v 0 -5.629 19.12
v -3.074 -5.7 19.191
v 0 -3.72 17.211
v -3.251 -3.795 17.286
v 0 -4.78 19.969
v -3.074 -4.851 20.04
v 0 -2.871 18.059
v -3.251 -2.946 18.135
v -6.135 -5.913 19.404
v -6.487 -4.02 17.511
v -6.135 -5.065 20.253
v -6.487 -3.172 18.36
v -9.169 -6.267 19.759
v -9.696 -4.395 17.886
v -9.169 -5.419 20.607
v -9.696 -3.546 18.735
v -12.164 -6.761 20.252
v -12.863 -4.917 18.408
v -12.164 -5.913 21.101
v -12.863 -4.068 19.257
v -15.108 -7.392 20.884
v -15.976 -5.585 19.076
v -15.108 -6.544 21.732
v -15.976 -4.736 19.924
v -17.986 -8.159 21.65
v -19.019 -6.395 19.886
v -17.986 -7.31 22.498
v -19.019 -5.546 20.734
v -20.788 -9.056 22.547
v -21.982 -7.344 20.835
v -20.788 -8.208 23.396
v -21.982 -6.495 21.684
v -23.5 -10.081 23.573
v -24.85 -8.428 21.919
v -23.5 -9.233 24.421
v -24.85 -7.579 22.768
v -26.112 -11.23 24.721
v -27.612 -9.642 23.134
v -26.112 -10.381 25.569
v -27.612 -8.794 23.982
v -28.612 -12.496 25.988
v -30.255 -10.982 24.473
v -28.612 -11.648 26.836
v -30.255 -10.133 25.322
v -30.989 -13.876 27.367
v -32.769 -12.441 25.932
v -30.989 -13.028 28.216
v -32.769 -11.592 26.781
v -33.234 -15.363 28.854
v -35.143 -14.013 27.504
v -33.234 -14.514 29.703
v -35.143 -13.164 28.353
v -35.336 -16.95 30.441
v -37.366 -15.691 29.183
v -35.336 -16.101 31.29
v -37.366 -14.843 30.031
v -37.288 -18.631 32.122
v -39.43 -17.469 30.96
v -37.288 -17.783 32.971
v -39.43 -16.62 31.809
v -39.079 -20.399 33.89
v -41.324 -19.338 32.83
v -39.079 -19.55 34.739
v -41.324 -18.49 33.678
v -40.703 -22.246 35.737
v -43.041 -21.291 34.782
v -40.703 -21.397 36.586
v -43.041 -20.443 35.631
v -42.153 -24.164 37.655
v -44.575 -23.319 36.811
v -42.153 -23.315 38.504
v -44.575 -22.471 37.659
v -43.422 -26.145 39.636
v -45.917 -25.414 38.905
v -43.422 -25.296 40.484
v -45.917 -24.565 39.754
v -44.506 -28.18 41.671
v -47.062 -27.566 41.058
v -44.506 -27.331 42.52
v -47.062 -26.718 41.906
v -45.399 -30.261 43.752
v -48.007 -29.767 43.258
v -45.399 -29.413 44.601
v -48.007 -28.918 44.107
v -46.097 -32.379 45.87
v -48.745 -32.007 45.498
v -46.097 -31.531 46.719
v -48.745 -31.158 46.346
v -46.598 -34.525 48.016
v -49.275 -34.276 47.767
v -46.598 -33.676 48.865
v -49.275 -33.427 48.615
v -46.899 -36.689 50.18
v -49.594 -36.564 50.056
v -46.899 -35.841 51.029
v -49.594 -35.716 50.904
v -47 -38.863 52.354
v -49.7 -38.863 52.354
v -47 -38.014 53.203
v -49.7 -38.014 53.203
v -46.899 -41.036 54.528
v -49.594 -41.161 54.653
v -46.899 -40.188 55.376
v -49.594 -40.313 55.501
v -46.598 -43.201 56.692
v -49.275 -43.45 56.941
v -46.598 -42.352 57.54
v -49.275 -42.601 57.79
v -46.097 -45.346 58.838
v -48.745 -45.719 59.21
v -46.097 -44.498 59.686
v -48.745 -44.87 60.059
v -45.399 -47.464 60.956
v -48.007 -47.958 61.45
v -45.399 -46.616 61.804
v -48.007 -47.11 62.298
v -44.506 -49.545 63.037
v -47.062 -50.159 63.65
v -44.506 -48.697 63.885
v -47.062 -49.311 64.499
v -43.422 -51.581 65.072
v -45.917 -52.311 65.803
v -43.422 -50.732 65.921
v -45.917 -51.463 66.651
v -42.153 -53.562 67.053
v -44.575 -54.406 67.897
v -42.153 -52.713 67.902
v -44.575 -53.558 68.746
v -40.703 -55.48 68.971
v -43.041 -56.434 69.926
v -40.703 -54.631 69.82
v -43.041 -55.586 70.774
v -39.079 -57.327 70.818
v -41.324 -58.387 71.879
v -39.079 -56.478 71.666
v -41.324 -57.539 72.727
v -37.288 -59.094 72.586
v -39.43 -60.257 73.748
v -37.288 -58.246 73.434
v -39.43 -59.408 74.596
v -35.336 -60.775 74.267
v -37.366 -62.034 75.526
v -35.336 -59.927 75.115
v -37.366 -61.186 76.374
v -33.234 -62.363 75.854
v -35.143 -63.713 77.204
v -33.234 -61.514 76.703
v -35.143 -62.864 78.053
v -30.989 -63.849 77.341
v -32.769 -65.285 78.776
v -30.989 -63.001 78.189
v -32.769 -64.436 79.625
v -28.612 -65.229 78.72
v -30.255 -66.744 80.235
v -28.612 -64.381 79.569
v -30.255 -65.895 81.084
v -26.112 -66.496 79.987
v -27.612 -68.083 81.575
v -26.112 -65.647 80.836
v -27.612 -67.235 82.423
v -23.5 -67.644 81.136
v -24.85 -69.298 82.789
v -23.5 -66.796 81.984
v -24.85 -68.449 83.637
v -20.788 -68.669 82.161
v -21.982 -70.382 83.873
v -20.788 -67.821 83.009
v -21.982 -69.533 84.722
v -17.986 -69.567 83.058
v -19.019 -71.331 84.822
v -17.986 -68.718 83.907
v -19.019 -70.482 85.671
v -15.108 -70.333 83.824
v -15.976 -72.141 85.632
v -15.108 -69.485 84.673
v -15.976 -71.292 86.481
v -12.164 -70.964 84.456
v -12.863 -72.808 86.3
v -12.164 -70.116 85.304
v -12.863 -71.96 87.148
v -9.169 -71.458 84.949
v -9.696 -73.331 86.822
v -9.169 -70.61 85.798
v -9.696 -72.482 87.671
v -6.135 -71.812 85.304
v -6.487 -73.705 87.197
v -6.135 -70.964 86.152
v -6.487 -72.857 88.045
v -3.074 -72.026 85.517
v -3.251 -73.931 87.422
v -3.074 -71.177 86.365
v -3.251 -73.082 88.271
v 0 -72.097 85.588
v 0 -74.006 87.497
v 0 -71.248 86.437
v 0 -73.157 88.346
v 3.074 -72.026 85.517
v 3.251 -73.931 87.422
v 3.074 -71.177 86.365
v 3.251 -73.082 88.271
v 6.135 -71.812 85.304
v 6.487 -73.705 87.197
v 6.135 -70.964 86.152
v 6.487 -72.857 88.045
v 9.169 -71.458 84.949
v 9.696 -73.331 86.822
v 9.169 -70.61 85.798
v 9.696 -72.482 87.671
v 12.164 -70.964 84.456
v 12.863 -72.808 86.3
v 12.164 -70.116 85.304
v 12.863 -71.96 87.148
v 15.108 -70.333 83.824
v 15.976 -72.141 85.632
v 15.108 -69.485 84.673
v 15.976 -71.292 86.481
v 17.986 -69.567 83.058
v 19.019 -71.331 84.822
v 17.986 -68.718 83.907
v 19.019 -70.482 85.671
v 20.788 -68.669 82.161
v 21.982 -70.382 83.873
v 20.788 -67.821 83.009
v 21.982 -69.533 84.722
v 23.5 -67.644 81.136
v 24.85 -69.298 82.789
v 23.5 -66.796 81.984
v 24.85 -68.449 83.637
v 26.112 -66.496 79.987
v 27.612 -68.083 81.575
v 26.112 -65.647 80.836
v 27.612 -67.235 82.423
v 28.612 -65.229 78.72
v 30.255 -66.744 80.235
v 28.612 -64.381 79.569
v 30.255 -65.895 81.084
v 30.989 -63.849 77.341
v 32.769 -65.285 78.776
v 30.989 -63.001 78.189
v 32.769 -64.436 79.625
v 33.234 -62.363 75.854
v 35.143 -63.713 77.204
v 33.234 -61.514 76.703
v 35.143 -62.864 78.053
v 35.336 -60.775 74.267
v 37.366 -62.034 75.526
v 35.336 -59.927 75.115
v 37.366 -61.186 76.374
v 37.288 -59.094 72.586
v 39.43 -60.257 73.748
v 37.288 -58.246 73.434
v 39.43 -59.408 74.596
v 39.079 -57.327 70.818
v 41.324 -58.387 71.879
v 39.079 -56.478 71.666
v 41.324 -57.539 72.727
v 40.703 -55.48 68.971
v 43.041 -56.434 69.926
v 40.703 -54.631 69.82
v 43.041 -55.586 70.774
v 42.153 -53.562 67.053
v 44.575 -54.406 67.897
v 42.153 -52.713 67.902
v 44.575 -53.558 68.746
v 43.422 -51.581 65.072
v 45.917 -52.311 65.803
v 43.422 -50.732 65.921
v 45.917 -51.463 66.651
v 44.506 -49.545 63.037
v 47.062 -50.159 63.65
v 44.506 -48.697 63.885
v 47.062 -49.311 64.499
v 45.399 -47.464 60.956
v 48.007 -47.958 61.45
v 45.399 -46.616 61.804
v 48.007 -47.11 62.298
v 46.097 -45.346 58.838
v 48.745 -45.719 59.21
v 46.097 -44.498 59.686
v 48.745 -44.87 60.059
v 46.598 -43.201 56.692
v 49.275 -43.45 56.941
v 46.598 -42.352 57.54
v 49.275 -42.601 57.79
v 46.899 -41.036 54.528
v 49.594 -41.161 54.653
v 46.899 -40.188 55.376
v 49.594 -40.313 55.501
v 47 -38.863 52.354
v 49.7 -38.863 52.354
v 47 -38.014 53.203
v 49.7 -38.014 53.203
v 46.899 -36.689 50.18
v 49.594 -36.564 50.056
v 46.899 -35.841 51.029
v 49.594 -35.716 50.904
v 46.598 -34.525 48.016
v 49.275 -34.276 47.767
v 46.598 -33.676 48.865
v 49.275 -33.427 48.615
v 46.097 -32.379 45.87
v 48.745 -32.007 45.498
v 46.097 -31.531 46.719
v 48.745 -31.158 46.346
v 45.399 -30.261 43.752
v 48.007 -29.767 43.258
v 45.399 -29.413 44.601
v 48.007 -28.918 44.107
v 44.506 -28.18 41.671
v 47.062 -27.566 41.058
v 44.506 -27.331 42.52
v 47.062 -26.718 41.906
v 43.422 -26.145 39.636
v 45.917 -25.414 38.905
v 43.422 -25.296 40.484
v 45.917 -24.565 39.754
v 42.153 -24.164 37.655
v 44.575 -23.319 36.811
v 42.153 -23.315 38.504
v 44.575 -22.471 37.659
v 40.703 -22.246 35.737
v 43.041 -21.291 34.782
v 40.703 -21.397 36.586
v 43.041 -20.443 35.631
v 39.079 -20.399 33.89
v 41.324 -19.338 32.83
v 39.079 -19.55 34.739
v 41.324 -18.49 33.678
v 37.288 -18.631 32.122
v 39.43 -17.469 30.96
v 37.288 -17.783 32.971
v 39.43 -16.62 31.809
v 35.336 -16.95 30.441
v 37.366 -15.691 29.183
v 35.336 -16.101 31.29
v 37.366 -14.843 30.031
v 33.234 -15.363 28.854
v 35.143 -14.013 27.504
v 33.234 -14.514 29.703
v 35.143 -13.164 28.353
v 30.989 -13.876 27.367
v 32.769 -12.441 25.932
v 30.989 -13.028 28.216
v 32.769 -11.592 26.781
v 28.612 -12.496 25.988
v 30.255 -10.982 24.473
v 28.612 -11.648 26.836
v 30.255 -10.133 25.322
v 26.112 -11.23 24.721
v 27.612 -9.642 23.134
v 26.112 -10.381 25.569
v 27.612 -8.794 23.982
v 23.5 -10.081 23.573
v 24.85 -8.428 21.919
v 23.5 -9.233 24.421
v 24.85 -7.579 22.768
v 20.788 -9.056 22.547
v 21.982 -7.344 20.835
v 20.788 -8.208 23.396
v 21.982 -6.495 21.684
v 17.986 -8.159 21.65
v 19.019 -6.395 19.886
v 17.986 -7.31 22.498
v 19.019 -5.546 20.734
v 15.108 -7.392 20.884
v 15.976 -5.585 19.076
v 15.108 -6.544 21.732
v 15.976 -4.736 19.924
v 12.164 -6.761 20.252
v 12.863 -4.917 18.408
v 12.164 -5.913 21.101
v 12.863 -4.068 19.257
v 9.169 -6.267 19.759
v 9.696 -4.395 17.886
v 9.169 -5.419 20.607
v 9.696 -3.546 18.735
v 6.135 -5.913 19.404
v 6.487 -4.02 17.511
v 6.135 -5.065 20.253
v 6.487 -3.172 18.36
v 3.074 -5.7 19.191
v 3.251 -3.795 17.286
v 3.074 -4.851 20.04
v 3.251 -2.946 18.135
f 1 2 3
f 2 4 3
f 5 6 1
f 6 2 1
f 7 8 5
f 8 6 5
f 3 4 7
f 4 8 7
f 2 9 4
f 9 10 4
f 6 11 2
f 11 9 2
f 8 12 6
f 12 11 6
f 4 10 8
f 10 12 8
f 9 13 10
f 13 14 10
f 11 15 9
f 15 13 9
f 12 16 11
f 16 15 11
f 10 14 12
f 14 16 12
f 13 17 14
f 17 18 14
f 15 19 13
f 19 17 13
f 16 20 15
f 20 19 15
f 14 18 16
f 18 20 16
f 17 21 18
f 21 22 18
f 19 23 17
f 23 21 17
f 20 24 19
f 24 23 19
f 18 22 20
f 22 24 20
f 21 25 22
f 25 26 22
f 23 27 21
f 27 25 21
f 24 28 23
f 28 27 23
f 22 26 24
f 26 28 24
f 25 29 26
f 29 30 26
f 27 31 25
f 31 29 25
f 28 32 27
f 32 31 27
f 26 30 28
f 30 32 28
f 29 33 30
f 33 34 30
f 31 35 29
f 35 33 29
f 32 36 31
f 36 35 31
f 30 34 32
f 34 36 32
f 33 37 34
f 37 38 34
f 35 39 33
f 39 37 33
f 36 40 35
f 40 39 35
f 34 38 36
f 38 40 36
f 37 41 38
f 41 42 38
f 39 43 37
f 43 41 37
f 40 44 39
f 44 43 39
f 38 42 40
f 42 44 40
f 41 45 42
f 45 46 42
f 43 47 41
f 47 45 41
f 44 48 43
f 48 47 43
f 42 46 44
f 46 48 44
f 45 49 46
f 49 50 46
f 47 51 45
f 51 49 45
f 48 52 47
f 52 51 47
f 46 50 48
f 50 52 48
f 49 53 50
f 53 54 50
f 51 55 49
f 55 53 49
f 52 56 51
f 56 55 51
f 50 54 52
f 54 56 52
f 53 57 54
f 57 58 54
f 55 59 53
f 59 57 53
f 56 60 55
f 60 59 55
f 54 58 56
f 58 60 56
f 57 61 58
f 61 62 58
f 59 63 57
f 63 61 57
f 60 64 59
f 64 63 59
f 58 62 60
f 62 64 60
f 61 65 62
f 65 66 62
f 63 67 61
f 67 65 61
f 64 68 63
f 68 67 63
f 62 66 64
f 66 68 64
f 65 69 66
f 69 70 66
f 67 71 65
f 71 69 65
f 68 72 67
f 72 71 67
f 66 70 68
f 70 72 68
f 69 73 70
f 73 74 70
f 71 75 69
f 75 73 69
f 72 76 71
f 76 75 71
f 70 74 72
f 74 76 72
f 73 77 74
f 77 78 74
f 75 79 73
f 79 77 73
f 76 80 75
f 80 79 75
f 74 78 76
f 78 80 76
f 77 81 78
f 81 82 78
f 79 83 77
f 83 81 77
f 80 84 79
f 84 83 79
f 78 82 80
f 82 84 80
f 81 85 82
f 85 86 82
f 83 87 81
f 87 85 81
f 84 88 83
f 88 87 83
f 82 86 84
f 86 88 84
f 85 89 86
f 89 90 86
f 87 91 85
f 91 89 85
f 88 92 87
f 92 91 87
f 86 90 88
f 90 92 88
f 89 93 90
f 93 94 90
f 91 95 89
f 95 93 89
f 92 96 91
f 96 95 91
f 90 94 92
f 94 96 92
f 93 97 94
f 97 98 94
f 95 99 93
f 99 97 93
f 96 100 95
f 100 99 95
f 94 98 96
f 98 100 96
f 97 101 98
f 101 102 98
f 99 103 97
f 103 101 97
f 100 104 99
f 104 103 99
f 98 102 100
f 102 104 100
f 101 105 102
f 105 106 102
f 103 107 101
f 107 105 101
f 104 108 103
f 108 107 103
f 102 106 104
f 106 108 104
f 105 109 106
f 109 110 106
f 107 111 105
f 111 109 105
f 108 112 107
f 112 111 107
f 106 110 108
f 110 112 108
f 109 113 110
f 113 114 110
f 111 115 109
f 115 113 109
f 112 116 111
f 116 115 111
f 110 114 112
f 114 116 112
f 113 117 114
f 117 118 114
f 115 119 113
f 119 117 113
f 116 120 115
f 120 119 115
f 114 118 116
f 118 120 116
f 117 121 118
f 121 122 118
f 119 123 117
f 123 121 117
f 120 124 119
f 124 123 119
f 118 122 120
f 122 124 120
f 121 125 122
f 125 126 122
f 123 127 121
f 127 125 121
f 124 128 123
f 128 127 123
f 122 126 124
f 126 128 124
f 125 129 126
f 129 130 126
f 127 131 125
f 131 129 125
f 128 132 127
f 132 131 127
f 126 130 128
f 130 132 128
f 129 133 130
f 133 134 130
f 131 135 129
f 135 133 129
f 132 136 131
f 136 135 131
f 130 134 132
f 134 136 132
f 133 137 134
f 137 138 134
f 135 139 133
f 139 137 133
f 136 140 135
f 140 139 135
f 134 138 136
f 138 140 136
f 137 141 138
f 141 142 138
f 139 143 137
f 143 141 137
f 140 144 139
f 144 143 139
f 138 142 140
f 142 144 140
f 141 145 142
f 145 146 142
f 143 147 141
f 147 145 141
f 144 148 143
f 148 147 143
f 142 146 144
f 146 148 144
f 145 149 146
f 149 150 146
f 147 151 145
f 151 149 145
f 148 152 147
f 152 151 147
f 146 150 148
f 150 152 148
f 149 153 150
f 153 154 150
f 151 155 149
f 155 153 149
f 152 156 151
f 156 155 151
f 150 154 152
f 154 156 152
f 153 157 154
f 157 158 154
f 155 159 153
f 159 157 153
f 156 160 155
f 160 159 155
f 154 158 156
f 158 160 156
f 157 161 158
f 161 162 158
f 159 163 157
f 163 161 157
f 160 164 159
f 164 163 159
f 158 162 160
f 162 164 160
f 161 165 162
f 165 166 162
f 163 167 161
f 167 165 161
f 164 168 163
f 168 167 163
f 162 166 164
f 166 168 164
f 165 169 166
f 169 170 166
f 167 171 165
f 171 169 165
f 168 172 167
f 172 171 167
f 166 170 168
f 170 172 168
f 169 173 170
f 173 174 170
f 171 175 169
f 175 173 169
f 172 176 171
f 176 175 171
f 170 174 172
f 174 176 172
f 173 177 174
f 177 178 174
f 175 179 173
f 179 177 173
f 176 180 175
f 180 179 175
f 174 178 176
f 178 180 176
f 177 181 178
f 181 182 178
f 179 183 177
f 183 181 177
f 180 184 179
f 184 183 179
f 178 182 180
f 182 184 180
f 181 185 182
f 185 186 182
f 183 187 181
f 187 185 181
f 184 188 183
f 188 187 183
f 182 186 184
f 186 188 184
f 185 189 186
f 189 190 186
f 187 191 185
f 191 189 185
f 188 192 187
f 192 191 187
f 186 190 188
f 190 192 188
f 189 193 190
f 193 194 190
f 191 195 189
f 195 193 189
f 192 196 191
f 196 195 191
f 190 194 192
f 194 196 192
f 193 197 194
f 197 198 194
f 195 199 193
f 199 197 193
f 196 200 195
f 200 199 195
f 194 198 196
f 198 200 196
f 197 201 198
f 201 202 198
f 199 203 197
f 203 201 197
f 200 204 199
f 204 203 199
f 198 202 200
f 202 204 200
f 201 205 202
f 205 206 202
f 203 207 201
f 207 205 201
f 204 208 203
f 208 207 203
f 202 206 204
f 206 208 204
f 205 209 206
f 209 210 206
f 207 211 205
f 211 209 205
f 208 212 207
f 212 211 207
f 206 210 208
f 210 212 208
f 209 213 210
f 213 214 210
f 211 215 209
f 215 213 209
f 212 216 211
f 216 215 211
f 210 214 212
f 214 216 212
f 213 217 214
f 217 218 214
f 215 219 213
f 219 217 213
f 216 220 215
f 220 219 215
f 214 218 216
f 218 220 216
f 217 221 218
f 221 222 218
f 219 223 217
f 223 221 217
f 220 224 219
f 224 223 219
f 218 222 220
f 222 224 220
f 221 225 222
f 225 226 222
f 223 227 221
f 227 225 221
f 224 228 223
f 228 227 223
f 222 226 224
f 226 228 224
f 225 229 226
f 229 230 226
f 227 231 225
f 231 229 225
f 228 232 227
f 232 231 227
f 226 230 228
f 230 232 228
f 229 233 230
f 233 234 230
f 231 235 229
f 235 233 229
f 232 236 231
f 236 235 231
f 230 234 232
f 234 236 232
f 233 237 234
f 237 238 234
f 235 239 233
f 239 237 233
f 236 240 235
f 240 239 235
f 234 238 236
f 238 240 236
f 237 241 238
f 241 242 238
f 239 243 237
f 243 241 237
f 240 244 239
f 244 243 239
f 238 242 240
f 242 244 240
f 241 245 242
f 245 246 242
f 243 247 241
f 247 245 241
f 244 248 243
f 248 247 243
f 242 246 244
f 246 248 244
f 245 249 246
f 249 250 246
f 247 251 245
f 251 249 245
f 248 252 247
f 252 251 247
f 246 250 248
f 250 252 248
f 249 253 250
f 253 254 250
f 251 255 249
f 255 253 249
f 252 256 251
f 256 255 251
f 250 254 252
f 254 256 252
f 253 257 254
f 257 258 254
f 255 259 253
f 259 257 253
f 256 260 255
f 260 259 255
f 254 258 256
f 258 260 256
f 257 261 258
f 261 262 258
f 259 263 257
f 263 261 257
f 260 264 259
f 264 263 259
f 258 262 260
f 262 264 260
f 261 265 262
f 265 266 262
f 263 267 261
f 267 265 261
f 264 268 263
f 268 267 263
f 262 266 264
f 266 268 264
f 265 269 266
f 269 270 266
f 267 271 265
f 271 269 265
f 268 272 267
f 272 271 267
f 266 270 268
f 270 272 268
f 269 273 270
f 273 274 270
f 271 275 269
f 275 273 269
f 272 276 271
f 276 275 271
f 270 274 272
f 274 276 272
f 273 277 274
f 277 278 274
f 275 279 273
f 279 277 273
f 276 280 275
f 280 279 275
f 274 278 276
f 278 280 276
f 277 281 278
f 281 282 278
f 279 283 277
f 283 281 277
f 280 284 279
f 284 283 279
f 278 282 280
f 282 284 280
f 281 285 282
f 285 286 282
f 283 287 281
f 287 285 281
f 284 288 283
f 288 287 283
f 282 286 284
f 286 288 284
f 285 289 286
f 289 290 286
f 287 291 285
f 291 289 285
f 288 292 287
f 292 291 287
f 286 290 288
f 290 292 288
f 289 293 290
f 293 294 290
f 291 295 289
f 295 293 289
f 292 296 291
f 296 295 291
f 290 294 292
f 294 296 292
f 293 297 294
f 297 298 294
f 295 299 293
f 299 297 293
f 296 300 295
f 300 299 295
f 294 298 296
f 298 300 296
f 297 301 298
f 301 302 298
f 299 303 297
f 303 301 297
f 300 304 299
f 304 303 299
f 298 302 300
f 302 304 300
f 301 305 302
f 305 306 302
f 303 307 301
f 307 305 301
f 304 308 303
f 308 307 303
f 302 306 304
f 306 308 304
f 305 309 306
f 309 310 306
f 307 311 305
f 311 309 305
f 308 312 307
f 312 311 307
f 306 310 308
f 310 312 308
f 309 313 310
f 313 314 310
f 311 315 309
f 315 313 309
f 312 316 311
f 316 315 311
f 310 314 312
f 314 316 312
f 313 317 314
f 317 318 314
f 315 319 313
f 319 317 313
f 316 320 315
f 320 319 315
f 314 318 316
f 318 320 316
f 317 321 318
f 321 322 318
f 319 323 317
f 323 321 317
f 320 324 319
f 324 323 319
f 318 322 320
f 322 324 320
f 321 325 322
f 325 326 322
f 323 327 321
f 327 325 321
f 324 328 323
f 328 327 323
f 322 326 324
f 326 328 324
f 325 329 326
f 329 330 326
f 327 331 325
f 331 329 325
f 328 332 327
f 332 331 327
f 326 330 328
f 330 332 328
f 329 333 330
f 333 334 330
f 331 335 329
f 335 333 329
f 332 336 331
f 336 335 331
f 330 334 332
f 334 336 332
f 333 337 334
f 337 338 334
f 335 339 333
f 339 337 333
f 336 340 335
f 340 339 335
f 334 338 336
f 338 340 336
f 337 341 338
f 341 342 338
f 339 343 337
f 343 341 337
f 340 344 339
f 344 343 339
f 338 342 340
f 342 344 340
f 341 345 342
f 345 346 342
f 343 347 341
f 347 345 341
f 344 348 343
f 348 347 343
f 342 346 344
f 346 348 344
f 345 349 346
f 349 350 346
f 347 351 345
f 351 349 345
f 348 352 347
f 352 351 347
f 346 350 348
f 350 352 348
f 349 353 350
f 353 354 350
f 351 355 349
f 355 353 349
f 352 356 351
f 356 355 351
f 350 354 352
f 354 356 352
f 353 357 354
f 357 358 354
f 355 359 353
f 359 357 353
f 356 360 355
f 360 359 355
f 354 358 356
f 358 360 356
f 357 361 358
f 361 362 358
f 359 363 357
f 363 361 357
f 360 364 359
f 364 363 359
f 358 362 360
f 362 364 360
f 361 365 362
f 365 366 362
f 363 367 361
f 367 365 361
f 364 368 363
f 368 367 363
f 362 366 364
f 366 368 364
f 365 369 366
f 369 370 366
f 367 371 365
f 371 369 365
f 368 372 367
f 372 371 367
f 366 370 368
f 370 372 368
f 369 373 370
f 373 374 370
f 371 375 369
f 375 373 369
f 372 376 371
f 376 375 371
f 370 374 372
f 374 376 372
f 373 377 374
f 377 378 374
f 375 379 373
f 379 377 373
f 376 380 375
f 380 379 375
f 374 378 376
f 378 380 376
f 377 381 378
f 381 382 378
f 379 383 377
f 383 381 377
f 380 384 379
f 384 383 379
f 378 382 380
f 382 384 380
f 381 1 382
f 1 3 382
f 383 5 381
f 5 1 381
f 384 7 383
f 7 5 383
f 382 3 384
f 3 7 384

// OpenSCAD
include <../lib/servo-duct-manifold-lib.scad>;
$fn = 96;
cubic_cell_4_gasket();
